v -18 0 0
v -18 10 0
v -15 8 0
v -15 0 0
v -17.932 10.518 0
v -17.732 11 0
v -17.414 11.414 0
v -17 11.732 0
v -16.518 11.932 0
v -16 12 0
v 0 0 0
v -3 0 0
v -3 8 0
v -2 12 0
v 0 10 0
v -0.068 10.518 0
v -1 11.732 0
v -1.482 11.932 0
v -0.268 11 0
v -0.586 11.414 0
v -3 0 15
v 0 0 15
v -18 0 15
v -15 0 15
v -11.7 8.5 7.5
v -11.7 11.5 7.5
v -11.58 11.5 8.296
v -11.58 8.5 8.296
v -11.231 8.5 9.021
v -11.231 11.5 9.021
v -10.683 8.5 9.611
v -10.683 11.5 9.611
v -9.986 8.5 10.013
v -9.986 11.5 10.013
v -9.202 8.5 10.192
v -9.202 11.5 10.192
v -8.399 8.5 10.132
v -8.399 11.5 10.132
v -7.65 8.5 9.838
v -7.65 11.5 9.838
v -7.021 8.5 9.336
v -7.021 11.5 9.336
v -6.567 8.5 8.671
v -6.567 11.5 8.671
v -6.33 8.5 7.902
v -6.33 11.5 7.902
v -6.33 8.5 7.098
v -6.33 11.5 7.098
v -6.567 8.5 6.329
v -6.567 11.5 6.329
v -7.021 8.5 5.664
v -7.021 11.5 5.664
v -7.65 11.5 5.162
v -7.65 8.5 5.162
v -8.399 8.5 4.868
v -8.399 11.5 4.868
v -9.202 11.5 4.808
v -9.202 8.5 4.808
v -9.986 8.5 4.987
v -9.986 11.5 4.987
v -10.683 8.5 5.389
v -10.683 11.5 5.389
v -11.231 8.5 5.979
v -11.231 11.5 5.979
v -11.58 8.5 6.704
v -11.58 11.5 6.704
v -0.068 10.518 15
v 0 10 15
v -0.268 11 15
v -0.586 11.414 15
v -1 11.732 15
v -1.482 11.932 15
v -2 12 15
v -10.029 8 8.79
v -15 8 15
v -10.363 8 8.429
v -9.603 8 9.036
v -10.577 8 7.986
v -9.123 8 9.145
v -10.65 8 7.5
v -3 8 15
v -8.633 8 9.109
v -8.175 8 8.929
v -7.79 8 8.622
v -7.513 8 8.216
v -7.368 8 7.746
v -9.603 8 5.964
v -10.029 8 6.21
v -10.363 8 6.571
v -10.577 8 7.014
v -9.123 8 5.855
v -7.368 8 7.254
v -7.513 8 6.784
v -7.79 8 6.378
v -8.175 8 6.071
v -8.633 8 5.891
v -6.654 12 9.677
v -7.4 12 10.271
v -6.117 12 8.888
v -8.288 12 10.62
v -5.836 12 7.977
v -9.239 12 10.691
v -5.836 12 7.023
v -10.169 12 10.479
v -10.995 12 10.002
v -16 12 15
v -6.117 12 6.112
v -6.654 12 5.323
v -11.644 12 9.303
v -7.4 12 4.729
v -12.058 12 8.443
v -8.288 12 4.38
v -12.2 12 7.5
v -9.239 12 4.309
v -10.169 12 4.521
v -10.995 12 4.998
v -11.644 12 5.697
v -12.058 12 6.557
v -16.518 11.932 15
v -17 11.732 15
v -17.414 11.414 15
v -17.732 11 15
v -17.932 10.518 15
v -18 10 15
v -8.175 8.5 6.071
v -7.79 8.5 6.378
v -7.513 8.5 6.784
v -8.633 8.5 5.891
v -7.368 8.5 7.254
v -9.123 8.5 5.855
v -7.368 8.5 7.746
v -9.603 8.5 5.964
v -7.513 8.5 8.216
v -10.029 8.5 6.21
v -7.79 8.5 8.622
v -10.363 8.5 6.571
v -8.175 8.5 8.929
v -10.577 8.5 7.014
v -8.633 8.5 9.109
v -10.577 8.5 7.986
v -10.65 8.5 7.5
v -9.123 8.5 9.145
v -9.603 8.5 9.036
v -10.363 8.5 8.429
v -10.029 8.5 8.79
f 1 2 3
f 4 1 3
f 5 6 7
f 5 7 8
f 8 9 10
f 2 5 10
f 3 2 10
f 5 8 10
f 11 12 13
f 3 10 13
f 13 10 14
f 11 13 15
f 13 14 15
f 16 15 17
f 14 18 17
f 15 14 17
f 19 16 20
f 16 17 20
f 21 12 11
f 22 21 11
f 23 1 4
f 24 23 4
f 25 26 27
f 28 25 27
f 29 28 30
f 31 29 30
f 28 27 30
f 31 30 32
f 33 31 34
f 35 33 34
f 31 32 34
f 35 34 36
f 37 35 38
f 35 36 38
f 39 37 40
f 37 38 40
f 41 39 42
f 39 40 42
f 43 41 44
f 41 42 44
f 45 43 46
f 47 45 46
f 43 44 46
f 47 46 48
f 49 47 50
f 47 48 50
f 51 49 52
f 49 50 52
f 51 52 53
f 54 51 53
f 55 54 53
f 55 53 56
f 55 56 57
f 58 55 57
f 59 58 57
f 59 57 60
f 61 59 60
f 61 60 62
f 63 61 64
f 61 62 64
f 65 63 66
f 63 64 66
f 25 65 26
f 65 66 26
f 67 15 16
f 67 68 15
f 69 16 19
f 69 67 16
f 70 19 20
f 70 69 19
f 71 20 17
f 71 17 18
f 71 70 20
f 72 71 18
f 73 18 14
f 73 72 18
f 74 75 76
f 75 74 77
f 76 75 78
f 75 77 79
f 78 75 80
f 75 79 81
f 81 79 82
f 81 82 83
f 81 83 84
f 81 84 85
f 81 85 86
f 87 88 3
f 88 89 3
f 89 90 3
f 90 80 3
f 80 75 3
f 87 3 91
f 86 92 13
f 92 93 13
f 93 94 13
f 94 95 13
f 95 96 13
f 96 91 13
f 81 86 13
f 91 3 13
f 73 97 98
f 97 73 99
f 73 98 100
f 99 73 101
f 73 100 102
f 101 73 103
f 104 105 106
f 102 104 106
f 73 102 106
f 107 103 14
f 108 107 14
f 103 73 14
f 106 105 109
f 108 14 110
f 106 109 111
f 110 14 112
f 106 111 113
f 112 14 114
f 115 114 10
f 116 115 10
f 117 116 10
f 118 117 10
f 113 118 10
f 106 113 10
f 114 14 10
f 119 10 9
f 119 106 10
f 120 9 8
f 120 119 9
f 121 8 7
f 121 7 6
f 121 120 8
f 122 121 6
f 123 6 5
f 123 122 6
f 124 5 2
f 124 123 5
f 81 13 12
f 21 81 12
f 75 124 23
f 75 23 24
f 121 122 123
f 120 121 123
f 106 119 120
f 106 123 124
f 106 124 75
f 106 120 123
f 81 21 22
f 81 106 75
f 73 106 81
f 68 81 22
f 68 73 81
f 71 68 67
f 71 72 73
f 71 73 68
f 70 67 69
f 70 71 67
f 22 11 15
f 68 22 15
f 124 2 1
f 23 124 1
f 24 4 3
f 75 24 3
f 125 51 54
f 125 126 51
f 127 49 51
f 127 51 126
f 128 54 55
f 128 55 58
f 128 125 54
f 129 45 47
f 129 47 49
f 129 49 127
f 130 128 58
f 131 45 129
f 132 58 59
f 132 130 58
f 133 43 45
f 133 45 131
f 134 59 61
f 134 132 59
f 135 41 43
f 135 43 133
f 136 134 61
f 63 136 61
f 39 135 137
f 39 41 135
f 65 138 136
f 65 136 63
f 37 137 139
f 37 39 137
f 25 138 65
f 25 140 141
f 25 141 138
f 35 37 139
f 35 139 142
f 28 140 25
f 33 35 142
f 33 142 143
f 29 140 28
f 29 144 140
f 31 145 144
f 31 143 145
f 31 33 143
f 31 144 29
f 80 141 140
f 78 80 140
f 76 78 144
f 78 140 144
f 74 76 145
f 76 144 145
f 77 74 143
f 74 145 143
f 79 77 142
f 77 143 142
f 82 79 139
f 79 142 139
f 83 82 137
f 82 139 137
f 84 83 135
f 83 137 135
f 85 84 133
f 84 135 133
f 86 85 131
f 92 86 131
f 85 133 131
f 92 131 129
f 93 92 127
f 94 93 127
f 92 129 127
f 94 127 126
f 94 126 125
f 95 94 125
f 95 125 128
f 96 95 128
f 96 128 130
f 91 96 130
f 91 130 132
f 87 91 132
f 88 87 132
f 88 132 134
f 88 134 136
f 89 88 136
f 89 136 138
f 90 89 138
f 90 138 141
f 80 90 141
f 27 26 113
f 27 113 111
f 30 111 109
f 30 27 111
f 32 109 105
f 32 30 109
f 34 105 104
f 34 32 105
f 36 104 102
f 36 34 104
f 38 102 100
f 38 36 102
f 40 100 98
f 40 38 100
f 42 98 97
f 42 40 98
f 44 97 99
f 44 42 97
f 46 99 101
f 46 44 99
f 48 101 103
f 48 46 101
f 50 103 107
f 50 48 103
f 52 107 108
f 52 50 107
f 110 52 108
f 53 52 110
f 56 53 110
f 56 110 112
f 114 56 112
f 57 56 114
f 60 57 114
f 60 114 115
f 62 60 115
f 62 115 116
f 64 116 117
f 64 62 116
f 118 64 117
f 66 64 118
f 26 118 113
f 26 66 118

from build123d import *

# Parameters (mm, degrees)
EXTRUDE_1_DEPTH     = 15
SKETCH_2_R          = 2.7
CUT_EXTRUDE_1_DEPTH = 3.5
SKETCH_3_R          = 1.65
CUT_EXTRUDE_2_DEPTH = 25.924887161
FILLET_1_R          = 2
CHAMFER_1_SIZE      = 0.5


# Read off the part's stored shape, not the designer's step: 填料-伸長1
with BuildPart() as part:
    # 填料-伸長1 outline → 填料-伸長1 (new body)
    with BuildSketch(Plane.XY):
        Polygon((0, 0), (0, 12), (-18, 12), (-18, 0), (-15, 0), (-15, 8), (-3, 8), (-3, 0), align=None)
    extrude(amount=EXTRUDE_1_DEPTH)

    # 草圖2 → 除料-伸長1 (cut)
    with BuildSketch(Plane(origin=(0, 12, 0), x_dir=(1, 0, 0), z_dir=(0, 1, 0))):
        with Locations(Location((-9, -7.5, 0), (0, 0, 180))):
            Circle(SKETCH_2_R)
    extrude(amount=-CUT_EXTRUDE_1_DEPTH, mode=Mode.SUBTRACT)

    # 草圖3 → 除料-伸長2 (cut, through all)
    with BuildSketch(Plane(origin=(0, 8.5, 0), x_dir=(1, 0, 0), z_dir=(0, 1, 0))):
        with Locations(Location((-9, -7.5, 0), (0, 0, 180))):
            Circle(SKETCH_3_R)
    extrude(amount=-CUT_EXTRUDE_2_DEPTH, mode=Mode.SUBTRACT)

    # 圓角1
    fillet_1_edges = [part.edges().sort_by_distance(p)[0] for p in [
        (-18, 12, 7.5),
        (0, 12, 7.5),
    ]]
    fillet(fillet_1_edges, radius=FILLET_1_R)

    # 導角1
    chamfer_1_edges = [part.edges().sort_by_distance(p)[0] for p in [
        (-6.3, 12, 7.5),
    ]]
    chamfer(chamfer_1_edges, length=CHAMFER_1_SIZE)


solid = part.part
